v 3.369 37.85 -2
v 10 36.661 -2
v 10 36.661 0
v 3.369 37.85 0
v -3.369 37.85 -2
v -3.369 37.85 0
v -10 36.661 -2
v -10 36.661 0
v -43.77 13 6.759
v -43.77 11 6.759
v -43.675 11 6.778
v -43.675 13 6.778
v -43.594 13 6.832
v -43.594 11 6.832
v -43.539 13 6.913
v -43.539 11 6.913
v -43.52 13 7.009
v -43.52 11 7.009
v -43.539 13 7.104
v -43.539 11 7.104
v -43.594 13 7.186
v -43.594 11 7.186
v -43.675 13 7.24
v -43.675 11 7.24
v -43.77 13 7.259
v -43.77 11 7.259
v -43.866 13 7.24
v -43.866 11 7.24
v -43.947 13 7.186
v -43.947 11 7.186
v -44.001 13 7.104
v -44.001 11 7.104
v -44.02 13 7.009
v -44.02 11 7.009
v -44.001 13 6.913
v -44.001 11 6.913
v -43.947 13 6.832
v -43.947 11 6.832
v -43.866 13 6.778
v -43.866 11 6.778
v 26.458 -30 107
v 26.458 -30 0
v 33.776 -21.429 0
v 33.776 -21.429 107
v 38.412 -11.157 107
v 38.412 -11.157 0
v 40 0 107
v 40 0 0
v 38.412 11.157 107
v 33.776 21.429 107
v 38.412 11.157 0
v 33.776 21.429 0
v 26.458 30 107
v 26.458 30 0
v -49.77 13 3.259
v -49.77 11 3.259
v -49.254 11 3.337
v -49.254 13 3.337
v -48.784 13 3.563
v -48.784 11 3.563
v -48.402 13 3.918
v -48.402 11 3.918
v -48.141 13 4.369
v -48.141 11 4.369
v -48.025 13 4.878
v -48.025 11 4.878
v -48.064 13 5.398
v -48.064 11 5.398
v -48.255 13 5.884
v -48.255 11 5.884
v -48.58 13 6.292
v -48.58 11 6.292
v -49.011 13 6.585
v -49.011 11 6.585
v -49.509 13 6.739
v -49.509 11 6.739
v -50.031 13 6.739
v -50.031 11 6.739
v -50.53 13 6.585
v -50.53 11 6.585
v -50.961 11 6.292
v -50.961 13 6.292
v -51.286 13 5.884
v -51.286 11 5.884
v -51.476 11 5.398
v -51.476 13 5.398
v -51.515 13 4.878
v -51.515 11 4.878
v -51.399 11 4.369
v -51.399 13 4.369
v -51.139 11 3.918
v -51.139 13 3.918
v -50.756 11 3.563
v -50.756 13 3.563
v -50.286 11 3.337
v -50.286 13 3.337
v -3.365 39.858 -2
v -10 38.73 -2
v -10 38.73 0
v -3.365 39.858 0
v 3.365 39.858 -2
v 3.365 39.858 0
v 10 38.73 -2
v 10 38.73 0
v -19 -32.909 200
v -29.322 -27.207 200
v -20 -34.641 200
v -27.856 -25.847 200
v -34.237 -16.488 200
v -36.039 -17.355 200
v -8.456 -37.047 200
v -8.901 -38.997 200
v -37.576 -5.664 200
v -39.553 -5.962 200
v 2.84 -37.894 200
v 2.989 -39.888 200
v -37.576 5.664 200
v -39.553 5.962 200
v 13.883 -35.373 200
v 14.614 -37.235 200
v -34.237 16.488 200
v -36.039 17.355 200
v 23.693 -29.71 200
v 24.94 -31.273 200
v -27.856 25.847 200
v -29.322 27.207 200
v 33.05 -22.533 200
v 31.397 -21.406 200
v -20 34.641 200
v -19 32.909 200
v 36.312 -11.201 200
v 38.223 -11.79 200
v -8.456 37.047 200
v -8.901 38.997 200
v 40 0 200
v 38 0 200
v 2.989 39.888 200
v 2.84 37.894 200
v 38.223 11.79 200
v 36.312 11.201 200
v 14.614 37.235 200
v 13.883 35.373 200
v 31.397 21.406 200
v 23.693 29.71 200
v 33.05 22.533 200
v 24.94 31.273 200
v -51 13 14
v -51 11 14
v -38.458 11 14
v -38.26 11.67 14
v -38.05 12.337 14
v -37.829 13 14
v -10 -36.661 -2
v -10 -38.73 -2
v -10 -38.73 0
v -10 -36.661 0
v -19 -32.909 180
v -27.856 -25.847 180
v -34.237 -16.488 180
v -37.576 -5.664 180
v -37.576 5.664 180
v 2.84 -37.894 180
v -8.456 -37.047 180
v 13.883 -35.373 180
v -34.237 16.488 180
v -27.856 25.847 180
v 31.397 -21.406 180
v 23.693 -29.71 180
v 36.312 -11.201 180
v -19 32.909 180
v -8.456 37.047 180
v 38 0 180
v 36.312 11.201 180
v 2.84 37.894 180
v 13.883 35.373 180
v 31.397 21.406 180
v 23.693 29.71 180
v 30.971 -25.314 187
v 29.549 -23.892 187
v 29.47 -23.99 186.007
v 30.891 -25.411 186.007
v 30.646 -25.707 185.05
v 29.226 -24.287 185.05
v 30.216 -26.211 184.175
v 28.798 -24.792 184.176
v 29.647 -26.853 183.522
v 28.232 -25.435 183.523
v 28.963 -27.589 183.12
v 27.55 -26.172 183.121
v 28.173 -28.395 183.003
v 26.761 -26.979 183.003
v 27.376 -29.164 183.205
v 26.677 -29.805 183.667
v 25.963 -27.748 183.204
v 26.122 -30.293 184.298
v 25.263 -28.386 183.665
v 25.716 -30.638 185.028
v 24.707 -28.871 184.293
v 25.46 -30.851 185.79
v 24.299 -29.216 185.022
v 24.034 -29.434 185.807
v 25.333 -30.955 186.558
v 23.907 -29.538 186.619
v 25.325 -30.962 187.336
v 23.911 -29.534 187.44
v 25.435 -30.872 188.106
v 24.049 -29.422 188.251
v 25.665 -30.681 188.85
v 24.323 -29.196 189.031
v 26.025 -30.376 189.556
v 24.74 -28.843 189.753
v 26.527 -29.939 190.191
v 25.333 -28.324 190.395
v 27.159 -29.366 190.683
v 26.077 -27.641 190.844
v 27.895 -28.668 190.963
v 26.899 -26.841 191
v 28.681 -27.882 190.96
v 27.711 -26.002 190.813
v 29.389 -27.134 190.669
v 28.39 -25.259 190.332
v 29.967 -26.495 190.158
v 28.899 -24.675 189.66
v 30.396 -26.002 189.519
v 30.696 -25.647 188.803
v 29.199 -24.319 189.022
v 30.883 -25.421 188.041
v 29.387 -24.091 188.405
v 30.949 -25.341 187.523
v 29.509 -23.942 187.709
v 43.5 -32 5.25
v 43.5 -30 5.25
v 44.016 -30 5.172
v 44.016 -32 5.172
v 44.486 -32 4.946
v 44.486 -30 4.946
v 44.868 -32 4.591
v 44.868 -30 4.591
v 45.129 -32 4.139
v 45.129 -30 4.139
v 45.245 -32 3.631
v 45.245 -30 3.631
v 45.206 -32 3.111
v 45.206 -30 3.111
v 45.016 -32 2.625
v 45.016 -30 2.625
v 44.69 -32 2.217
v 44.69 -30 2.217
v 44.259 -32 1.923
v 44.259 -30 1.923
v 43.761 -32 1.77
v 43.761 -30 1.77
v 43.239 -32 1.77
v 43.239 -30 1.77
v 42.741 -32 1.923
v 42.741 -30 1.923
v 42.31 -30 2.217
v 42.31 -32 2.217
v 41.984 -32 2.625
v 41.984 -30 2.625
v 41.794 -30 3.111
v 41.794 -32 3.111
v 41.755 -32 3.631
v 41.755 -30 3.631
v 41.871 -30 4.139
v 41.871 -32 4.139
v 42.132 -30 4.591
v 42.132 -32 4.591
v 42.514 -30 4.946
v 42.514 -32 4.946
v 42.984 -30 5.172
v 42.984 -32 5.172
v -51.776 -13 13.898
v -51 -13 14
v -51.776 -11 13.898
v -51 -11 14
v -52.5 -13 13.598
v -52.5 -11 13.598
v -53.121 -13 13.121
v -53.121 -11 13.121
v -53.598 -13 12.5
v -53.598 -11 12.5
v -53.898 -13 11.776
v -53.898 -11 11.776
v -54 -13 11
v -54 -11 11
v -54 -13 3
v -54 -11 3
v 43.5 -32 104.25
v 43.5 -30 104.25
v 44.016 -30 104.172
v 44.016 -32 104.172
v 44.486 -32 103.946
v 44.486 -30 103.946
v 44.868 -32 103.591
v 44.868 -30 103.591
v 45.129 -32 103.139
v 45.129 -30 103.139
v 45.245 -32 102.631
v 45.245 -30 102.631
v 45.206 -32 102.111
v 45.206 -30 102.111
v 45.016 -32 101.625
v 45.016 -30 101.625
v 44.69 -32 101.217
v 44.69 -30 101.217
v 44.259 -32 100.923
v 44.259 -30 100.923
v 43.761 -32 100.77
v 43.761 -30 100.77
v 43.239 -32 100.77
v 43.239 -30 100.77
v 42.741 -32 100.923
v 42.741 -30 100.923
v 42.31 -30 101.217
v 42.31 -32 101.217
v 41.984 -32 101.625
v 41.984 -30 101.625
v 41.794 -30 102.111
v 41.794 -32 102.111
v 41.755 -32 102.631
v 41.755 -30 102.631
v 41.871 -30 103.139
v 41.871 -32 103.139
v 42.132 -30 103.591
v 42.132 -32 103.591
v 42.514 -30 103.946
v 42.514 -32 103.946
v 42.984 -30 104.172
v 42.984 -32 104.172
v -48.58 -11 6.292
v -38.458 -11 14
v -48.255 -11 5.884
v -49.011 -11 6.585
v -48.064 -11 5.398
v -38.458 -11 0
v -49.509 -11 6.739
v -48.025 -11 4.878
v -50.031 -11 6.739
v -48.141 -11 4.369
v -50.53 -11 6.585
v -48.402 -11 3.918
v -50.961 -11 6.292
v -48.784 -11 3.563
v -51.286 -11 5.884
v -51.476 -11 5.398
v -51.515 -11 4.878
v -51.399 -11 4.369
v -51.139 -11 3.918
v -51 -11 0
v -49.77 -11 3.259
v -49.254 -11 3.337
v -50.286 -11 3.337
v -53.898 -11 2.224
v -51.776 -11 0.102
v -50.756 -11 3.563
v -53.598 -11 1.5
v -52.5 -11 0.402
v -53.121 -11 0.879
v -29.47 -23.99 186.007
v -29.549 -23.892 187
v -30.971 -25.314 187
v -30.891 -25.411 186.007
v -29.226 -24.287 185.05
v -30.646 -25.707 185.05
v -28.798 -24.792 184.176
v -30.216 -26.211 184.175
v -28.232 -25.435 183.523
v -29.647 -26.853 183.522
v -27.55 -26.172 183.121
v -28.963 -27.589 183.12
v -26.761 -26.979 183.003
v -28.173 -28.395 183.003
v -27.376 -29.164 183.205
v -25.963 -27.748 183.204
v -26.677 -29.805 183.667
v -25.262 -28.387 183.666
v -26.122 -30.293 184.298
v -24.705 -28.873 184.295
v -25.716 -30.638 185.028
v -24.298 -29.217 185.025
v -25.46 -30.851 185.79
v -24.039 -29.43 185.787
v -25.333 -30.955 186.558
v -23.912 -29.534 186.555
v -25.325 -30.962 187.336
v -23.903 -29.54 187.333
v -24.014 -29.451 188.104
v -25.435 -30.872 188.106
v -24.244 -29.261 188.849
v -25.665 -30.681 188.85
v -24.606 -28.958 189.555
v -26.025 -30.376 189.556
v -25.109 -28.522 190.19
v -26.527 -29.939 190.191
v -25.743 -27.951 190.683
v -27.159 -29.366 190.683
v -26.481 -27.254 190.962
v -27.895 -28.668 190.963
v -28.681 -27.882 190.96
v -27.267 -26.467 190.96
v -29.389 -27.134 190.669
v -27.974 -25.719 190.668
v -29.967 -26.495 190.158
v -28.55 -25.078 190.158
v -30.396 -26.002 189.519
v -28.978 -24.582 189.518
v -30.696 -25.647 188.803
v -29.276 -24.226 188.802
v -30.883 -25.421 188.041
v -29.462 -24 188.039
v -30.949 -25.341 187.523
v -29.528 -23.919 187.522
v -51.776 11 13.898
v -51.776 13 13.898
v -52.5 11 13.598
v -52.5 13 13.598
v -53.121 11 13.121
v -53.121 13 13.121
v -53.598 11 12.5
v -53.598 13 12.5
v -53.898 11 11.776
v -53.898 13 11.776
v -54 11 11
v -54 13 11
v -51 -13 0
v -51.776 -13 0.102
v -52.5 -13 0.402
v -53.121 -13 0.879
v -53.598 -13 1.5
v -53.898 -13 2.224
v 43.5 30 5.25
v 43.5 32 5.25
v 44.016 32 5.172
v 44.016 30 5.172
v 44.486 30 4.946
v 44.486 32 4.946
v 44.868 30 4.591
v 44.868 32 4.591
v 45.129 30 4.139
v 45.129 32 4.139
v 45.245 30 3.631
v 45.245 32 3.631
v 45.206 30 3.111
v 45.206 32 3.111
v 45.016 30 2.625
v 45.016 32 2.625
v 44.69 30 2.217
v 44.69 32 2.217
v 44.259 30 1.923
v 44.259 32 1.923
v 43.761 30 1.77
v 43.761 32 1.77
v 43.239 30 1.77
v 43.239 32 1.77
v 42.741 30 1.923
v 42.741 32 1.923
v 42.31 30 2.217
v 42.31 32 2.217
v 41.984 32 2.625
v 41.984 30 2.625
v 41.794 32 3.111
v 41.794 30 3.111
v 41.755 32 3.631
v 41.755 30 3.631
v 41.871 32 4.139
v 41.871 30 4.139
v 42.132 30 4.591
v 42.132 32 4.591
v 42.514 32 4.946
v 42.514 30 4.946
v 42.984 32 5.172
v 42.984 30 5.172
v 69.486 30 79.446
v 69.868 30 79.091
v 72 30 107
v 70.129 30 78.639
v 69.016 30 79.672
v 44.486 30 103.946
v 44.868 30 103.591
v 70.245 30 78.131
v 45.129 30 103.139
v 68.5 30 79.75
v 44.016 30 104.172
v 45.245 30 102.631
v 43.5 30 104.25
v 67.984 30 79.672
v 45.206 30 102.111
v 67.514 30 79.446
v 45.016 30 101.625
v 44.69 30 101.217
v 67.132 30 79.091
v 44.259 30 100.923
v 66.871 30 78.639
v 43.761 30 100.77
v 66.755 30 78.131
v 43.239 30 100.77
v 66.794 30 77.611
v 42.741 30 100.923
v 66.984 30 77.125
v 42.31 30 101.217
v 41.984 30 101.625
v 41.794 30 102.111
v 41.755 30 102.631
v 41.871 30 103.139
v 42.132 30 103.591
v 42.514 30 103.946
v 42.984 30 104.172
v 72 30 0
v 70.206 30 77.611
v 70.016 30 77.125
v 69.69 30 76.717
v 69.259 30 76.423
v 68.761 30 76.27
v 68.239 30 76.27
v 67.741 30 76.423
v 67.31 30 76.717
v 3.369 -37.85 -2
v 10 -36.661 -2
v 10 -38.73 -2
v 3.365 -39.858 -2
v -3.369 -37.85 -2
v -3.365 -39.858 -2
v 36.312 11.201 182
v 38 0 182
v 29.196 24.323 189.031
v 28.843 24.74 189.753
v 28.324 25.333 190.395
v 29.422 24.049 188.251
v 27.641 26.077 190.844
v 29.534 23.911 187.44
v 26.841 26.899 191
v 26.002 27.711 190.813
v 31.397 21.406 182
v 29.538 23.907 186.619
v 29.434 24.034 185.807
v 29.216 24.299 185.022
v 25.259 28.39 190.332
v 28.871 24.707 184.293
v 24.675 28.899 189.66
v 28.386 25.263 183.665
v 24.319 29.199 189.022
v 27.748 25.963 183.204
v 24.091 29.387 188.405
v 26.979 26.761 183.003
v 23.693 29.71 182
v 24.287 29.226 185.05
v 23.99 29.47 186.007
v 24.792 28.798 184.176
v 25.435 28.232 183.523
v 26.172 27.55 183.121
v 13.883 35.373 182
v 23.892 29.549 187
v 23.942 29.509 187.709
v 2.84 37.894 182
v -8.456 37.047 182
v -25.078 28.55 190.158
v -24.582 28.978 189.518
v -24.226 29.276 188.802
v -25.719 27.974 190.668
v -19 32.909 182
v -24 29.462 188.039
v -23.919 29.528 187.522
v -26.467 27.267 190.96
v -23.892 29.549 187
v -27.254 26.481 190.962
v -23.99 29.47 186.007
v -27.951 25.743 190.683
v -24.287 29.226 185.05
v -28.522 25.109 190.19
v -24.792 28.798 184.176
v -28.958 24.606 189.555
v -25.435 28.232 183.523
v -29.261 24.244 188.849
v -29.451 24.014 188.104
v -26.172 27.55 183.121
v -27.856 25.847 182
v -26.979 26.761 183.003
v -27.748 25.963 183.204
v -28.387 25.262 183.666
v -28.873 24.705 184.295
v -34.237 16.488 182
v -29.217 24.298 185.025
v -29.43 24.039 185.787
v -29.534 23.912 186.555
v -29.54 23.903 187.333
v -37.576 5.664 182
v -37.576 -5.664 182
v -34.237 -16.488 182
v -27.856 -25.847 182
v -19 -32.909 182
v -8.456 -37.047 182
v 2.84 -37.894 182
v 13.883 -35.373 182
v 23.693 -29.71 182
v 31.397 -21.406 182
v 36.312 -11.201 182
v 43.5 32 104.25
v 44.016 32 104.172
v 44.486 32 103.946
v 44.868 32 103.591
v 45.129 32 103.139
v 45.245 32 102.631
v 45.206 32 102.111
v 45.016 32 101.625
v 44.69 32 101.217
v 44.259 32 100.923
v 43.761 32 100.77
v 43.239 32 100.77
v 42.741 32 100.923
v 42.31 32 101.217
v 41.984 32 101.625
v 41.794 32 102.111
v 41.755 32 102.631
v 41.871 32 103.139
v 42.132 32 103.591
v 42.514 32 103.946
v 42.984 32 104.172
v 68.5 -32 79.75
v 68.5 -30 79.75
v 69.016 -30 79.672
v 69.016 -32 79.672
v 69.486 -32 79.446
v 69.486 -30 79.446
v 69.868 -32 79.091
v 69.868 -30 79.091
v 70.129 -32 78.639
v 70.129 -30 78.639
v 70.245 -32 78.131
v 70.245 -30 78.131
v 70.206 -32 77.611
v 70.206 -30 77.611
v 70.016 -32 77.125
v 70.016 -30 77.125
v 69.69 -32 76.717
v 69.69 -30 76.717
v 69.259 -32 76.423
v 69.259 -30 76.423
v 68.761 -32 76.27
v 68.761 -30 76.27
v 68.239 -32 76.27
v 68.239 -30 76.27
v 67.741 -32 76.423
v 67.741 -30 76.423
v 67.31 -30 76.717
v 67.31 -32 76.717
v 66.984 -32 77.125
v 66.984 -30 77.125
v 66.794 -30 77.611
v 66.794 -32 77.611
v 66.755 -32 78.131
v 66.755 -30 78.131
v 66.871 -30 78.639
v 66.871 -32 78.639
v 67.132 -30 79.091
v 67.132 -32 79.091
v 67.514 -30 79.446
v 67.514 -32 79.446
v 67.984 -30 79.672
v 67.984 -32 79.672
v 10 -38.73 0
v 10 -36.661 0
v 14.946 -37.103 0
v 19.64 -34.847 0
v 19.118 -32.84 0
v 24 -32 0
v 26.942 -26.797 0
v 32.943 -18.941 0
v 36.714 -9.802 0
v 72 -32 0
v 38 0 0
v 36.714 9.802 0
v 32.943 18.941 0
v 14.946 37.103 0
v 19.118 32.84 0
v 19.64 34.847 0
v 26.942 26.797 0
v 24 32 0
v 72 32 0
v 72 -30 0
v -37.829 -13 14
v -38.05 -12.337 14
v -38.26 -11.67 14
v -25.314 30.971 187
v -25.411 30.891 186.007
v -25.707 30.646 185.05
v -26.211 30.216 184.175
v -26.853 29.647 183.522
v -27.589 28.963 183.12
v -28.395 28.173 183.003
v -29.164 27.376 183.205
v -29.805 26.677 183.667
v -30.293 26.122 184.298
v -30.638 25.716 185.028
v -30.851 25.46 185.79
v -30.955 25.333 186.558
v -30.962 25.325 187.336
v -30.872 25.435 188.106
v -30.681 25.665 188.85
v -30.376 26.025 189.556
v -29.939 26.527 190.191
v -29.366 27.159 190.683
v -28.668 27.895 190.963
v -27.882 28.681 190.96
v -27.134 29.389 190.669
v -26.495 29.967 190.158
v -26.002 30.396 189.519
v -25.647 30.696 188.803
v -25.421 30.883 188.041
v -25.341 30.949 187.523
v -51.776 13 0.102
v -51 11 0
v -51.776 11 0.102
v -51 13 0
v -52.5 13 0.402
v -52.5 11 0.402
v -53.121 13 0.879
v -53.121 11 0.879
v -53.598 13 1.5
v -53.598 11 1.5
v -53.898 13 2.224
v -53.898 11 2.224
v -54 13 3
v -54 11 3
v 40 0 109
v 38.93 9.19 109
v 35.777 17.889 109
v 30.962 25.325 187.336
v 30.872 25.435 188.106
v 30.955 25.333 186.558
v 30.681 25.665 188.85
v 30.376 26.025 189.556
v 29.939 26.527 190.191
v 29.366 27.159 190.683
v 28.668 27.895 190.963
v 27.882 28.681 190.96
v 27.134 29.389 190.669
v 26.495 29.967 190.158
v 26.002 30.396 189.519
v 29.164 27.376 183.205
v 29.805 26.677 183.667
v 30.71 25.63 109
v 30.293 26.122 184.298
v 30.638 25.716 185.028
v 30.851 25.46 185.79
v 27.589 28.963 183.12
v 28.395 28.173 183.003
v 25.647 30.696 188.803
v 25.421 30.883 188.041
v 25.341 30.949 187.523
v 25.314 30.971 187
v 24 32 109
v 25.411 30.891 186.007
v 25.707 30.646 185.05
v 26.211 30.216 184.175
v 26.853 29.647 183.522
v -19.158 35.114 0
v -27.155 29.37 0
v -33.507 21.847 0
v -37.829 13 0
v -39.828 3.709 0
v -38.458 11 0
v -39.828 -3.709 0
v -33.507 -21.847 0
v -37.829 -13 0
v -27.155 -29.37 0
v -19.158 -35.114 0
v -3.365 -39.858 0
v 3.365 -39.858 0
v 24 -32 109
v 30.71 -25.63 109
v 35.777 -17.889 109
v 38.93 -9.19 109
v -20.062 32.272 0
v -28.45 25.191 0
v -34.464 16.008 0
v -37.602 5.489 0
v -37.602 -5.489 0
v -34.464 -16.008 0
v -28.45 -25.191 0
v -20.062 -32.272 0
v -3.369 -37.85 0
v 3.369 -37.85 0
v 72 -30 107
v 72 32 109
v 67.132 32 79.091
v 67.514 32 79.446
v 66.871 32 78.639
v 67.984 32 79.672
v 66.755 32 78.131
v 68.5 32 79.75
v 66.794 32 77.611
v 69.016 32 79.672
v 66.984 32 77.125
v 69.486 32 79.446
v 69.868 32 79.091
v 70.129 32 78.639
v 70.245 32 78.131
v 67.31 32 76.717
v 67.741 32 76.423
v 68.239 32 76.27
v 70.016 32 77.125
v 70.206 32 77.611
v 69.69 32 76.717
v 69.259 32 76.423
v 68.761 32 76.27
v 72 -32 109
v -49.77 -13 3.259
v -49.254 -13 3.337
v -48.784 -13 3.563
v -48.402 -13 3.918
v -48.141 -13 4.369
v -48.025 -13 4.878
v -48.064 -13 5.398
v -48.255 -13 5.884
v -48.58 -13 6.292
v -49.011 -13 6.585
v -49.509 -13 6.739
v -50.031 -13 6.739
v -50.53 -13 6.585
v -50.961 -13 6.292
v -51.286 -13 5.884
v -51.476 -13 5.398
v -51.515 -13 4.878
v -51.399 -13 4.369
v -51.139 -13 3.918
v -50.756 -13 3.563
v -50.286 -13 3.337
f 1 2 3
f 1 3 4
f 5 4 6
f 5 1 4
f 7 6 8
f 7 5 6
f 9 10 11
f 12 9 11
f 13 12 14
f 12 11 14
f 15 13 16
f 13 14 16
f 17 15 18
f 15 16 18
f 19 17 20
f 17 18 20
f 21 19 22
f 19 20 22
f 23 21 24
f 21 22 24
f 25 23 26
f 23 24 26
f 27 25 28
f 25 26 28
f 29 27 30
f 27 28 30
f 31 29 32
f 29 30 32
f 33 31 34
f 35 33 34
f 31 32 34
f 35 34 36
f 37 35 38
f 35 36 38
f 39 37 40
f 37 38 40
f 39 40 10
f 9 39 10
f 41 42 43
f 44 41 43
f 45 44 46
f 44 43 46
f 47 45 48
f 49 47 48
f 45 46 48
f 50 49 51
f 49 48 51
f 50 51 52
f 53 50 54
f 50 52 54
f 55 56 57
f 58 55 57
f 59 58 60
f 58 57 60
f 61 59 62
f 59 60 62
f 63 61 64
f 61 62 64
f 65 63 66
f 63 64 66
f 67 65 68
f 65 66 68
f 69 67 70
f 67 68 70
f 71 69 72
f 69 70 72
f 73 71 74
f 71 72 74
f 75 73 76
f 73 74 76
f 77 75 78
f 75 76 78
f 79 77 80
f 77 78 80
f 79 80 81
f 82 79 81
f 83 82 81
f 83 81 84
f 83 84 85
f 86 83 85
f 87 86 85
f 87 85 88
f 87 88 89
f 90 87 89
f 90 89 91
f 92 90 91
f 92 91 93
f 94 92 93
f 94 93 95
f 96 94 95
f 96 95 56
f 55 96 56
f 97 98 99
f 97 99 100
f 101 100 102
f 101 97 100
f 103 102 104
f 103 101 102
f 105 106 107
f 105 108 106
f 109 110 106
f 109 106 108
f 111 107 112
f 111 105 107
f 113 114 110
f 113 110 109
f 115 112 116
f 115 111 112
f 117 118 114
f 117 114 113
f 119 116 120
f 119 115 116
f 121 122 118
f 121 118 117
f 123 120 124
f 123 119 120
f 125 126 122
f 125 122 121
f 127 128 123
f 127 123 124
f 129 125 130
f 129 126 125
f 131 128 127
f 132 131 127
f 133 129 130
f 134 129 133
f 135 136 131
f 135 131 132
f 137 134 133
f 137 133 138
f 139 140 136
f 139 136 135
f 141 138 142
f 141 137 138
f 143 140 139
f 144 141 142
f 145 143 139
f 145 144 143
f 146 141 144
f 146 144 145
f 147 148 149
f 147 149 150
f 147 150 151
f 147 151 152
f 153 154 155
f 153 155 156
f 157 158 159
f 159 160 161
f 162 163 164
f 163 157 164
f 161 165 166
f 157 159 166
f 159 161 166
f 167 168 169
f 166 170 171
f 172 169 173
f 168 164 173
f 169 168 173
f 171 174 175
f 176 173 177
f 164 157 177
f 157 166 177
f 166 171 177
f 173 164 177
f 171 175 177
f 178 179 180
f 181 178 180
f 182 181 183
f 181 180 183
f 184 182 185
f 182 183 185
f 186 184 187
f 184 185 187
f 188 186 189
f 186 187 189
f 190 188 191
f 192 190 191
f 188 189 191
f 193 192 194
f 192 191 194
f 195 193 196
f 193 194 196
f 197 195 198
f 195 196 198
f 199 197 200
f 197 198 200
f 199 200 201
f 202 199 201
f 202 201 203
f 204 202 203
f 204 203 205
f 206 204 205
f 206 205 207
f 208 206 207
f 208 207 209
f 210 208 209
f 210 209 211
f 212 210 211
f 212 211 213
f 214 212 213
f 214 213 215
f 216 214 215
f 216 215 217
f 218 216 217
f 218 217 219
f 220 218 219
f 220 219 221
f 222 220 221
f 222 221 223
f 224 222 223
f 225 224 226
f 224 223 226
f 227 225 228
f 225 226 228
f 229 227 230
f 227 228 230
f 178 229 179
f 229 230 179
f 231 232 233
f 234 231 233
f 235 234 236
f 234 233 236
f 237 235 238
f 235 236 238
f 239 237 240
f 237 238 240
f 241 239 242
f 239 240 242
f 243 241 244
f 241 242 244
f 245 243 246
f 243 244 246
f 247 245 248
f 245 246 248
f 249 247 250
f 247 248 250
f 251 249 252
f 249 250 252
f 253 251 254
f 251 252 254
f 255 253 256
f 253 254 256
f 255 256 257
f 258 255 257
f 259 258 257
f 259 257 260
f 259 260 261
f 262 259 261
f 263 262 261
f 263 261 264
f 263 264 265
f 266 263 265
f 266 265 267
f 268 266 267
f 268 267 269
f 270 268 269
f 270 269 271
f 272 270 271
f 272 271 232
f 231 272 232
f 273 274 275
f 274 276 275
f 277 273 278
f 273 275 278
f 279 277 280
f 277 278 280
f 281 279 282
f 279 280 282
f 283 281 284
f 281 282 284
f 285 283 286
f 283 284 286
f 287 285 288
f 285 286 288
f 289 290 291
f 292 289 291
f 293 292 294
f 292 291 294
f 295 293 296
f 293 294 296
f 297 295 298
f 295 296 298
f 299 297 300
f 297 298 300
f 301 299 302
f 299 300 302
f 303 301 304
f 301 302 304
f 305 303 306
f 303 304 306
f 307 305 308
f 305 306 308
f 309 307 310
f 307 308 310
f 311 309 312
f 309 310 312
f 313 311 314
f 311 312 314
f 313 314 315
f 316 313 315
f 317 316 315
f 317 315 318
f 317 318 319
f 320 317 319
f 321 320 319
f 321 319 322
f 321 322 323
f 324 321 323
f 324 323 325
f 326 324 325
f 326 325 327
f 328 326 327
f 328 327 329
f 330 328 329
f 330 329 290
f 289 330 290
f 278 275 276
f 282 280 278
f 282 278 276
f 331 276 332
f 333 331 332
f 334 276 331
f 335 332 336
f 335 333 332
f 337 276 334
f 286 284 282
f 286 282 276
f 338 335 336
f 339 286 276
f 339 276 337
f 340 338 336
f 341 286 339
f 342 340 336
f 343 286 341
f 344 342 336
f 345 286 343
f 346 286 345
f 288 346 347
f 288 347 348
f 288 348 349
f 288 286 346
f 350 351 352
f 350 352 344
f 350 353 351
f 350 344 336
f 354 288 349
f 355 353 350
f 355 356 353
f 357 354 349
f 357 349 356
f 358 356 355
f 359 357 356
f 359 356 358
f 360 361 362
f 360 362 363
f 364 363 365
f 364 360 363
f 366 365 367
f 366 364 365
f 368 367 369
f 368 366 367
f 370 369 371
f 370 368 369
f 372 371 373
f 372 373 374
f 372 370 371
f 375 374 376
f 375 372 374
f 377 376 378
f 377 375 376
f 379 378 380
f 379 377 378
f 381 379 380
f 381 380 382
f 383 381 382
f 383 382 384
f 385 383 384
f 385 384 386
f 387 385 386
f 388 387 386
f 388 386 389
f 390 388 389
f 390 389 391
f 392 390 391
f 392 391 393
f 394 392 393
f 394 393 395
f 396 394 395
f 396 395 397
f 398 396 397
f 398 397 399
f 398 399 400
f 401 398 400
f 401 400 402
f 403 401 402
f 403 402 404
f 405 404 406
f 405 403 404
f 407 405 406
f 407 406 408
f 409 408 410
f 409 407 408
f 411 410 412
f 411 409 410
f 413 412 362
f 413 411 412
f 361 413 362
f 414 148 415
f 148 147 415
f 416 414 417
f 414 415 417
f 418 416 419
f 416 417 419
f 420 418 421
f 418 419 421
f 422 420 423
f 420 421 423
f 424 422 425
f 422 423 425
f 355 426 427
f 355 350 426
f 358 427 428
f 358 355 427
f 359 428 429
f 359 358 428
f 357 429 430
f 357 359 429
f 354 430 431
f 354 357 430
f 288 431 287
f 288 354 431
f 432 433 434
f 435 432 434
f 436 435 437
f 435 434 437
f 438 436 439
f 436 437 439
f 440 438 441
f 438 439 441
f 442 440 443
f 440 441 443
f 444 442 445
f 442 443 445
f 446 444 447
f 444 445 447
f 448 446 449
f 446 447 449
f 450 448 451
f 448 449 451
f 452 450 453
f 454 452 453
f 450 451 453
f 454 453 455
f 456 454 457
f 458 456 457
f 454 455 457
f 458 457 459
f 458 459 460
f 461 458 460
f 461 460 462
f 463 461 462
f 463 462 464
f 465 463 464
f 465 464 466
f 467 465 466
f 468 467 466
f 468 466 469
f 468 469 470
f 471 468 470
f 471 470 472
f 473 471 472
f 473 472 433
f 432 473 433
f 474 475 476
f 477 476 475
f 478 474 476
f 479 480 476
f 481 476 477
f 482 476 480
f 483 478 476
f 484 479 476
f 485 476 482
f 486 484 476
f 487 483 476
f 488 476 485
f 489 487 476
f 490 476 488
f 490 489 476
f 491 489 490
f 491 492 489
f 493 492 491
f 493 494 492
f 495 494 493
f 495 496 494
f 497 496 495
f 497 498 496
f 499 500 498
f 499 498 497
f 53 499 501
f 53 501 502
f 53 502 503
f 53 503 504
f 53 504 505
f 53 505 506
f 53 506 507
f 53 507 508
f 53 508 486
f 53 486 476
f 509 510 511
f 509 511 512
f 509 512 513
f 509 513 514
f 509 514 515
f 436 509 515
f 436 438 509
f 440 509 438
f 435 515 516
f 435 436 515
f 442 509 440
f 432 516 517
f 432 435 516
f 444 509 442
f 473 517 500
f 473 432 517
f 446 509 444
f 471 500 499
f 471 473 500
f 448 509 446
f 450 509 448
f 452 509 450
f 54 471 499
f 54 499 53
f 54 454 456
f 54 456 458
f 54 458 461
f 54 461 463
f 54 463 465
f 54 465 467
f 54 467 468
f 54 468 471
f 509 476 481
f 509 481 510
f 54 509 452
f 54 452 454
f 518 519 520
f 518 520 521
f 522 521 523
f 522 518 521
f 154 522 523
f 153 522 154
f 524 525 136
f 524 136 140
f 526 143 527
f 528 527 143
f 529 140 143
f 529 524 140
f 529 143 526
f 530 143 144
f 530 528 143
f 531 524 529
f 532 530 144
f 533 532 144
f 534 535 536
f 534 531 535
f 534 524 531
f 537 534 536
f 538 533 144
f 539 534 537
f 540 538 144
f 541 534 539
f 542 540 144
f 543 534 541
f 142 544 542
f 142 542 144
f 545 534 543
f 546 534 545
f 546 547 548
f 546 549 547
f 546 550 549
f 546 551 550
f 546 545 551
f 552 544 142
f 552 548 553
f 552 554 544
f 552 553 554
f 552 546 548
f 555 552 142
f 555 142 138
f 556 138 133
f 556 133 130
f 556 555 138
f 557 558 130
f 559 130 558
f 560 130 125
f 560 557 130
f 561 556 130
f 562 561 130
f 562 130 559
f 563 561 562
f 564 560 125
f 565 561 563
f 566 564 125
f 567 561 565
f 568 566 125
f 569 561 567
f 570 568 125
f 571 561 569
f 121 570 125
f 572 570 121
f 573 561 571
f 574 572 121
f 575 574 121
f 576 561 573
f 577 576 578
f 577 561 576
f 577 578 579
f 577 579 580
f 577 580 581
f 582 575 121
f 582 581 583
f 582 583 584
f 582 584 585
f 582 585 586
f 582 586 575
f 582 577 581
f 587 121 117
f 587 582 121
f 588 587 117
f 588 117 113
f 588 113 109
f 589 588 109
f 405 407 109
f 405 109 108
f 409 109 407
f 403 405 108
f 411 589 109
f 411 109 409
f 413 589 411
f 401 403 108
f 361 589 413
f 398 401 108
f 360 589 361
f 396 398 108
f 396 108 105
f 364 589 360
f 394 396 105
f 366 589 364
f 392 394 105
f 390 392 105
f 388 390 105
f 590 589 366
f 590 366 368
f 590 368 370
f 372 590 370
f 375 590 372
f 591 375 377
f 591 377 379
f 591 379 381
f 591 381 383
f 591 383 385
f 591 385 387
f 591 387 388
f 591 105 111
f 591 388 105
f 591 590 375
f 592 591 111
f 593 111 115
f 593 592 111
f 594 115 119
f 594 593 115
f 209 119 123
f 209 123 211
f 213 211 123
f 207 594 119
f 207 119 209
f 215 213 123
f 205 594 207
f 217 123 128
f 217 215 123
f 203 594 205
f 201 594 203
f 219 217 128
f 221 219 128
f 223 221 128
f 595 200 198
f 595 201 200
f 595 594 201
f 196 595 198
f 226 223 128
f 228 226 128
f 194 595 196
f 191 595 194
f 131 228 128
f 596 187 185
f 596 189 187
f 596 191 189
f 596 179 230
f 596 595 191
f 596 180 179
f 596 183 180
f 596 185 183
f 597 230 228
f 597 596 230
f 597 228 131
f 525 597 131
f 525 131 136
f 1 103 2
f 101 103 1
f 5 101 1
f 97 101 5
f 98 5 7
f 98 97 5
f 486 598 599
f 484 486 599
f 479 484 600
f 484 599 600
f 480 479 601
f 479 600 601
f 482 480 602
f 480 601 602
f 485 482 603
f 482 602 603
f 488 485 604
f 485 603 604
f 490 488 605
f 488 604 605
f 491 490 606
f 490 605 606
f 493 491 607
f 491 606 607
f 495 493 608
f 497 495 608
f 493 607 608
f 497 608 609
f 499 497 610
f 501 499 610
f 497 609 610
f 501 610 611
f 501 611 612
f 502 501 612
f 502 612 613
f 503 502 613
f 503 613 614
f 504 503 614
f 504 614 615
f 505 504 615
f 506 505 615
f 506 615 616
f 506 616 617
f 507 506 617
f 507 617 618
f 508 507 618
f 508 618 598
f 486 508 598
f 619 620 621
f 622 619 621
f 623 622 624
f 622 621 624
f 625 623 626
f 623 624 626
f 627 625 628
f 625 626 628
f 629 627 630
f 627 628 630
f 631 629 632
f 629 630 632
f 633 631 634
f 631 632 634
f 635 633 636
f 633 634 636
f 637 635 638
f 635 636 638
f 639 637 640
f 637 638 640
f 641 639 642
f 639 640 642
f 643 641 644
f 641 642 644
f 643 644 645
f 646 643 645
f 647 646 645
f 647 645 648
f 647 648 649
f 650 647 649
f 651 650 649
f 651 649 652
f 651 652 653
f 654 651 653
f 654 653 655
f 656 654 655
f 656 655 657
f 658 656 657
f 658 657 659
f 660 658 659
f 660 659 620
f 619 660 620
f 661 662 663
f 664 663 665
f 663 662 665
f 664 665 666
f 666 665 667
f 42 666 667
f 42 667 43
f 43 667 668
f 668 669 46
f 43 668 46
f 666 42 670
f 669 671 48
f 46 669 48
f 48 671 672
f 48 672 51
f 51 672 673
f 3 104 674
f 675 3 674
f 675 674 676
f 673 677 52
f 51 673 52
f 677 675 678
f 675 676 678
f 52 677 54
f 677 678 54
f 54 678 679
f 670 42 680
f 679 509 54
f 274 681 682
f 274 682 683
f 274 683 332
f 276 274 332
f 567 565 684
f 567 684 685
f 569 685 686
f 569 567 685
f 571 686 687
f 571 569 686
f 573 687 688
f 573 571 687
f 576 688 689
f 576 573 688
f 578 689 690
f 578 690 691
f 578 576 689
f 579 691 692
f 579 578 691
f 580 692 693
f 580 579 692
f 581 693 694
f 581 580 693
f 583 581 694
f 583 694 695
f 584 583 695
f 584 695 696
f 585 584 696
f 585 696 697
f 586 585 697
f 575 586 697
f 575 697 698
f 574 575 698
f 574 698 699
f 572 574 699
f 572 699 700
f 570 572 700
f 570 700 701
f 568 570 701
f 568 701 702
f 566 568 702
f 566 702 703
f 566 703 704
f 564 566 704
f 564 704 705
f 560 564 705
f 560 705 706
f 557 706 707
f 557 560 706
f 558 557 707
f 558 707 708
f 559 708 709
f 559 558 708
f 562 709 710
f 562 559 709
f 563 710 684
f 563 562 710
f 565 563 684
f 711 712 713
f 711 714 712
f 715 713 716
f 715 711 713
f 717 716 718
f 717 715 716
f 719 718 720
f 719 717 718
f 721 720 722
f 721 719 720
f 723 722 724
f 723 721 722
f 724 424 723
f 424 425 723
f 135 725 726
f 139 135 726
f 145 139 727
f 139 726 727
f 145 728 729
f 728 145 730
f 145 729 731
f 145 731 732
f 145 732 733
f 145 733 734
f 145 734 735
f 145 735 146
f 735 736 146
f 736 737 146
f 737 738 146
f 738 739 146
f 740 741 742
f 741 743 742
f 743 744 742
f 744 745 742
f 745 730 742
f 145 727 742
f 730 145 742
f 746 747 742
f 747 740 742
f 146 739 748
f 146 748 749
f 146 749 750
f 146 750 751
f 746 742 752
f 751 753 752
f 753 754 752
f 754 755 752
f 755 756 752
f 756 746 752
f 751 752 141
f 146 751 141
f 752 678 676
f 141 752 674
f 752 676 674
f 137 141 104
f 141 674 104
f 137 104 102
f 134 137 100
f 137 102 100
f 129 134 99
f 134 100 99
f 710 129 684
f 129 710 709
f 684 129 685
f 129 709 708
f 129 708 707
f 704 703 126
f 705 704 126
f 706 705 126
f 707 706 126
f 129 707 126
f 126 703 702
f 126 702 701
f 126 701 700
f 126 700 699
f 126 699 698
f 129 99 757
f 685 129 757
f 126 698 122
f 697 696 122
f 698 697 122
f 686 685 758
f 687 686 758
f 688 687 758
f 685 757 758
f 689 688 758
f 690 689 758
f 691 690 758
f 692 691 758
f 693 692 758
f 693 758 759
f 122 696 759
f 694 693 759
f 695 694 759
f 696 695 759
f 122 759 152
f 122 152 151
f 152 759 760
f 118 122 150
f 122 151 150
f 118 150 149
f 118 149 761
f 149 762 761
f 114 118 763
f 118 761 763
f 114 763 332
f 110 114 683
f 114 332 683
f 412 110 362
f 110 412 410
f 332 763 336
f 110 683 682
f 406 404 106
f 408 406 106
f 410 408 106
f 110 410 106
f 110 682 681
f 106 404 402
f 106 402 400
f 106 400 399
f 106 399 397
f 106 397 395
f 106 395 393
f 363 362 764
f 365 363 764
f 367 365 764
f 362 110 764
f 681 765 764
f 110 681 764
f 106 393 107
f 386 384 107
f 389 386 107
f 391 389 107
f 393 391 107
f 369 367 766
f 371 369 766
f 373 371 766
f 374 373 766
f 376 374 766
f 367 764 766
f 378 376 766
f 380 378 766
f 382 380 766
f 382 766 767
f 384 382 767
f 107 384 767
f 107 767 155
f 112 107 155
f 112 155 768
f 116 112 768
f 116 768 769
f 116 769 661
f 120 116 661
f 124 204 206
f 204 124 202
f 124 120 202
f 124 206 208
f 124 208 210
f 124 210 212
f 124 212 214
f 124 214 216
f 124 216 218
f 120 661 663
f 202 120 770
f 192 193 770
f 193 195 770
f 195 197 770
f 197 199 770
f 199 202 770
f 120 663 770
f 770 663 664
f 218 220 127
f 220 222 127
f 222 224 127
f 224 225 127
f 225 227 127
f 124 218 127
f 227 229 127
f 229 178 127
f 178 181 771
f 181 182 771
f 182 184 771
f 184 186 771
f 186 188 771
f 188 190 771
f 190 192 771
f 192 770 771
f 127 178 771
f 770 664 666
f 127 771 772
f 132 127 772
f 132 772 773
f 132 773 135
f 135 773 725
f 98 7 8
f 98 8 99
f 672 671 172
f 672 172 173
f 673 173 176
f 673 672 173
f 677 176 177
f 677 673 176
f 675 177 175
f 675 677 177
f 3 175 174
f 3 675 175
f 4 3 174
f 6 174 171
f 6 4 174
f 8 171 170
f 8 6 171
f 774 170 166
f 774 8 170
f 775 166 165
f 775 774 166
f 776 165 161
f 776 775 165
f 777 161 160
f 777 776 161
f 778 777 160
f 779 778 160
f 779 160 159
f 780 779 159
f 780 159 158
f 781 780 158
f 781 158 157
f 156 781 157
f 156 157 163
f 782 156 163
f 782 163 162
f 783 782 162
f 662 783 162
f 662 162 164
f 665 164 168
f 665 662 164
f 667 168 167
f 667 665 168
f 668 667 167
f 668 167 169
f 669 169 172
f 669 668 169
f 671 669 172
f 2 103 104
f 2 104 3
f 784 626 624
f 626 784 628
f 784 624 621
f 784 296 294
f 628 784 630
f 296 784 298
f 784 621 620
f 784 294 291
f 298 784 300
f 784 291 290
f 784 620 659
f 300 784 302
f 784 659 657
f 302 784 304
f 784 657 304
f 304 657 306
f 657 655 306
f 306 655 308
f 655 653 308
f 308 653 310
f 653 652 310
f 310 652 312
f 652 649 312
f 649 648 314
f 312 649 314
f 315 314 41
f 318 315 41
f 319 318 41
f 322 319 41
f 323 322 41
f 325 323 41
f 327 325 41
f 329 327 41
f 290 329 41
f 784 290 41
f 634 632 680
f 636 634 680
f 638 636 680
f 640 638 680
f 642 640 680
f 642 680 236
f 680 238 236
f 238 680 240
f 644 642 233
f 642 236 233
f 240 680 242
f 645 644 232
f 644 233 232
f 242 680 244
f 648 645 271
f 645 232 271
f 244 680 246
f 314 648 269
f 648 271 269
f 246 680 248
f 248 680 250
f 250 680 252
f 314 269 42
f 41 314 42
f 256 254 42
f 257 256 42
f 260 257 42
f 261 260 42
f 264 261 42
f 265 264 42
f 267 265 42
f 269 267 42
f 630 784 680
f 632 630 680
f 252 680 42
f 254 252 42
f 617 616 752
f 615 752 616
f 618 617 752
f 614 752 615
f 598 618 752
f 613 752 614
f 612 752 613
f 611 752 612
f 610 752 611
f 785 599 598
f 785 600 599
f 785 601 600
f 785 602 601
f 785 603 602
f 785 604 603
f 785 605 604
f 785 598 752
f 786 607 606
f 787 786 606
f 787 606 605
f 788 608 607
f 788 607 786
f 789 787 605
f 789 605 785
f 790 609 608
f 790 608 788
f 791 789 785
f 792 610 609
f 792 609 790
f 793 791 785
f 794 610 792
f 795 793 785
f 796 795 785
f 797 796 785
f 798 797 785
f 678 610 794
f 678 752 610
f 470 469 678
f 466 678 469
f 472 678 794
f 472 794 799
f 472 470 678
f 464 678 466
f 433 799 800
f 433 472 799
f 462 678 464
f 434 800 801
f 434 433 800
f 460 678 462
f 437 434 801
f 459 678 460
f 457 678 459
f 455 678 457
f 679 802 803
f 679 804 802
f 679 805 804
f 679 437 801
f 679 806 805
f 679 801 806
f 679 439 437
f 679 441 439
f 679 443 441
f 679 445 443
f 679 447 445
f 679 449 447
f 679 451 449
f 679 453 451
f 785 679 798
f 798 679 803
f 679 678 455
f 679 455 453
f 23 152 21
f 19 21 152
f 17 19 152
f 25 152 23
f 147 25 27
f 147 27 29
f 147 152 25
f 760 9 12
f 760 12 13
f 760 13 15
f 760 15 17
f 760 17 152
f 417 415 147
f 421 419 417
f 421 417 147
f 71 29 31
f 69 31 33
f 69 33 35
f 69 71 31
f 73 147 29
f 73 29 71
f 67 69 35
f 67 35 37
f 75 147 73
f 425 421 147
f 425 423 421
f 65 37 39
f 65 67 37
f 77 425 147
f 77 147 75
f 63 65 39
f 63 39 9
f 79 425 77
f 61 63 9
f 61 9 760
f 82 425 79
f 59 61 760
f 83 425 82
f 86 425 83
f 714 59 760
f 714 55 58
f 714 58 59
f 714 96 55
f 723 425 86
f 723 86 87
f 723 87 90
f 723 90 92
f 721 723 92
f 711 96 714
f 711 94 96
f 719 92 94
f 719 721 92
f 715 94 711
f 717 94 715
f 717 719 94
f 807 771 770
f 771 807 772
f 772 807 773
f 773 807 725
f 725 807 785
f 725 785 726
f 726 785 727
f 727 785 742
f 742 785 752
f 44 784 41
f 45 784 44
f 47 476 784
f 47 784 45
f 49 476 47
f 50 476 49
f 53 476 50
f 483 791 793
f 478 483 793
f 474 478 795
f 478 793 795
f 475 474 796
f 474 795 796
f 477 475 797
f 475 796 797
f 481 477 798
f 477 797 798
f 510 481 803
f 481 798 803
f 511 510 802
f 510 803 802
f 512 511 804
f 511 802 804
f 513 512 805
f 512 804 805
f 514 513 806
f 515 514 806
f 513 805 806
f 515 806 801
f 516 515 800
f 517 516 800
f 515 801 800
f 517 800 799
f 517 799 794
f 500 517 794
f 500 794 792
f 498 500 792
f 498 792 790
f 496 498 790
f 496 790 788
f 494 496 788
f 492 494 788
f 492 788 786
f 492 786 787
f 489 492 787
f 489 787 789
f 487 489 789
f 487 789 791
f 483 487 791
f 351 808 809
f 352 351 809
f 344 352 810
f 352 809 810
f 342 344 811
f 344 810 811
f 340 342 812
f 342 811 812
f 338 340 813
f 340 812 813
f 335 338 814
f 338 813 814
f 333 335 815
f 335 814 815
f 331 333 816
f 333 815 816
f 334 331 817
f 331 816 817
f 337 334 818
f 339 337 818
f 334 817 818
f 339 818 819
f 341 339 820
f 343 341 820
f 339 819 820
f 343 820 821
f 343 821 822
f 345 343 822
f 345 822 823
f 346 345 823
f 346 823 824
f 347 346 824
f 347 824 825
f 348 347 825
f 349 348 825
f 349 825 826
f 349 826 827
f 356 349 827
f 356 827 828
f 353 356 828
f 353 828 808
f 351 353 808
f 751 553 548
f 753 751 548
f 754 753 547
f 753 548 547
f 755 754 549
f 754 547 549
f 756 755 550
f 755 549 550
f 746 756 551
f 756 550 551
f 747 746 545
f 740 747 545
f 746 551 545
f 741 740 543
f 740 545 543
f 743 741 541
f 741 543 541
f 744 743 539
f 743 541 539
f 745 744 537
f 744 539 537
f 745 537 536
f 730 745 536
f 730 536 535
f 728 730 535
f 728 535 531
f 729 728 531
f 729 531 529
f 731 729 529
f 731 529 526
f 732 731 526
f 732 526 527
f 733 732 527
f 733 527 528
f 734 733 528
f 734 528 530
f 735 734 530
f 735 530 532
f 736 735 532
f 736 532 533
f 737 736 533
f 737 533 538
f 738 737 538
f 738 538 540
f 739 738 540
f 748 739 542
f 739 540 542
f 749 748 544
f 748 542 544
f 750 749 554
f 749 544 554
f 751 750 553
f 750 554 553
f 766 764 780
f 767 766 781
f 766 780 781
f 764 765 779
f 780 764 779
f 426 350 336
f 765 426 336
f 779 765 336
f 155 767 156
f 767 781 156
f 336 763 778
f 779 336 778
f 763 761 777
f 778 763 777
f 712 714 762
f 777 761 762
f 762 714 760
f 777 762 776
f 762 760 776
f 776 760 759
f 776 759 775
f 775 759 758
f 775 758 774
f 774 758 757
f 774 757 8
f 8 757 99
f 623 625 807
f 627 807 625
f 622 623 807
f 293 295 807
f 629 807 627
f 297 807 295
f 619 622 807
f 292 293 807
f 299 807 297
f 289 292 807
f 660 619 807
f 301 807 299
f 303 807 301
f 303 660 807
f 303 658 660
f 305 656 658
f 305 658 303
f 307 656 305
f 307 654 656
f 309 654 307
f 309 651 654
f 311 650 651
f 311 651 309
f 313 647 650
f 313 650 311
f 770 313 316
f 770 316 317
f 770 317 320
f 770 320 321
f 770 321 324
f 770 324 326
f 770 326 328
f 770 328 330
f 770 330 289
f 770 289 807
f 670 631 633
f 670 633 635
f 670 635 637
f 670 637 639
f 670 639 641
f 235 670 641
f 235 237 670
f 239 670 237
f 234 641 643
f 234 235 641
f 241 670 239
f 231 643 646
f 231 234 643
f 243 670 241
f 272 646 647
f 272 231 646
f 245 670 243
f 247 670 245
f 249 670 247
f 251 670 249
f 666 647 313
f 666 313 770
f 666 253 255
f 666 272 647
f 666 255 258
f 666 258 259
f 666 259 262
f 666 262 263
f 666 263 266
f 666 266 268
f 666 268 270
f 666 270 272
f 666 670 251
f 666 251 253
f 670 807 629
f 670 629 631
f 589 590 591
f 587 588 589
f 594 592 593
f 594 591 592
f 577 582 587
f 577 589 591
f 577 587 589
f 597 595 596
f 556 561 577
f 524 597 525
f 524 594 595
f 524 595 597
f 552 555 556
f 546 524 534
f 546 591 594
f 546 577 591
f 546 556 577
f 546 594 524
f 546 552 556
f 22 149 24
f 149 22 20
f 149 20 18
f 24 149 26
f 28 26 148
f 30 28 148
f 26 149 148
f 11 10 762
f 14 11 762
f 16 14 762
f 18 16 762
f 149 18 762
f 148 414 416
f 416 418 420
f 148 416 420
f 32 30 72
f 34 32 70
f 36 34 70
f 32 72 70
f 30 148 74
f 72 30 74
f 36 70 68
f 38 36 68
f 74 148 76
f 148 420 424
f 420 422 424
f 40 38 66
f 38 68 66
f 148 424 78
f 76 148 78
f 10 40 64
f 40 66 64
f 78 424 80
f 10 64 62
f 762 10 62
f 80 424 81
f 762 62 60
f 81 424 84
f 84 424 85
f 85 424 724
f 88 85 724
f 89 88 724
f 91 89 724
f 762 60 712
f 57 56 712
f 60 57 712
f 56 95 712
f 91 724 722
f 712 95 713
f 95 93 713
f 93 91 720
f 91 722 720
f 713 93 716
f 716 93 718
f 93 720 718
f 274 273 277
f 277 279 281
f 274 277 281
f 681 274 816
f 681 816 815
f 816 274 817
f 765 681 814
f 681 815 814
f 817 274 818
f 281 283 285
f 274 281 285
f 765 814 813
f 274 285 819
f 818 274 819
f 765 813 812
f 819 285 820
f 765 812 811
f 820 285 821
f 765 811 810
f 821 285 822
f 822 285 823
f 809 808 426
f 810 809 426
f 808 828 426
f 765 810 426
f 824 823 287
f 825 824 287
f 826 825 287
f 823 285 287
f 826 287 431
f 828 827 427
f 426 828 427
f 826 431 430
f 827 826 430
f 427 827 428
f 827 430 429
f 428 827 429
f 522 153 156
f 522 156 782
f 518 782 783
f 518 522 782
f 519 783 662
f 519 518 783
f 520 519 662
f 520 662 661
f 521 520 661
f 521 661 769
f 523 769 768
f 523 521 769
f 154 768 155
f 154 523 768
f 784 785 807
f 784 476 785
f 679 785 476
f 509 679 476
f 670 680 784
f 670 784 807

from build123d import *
from build123d.topology import SkipClean

# Parameters (mm, degrees)
SKETCH1_R                      = 40
SKETCH1_R_2                    = 38
BOSS_EXTRUDE1_DEPTH            = 200
SKETCH2_R                      = 40
BOSS_EXTRUDE2_DEPTH            = 2
BOSS_EXTRUDE3_DEPTH            = 107
BOSS_EXTRUDE4_DEPTH            = 2
SKETCH5_R                      = 1.75
CUT_EXTRUDE1_DEPTH             = 225.428162226
CUT_EXTRUDE2_REACH             = 218.296
SKETCH6_R                      = 4
CUT_EXTRUDE2_DIRECTION_2_REACH = 218.296
CIRPATTERN1_COUNT              = 2
CIRPATTERN1_ANGLE              = 90
BOSS_EXTRUDE5_REACH            = 241.742
BOSS_EXTRUDE5_END_RADIUS       = 40
SKETCH7_W                      = 14
SKETCH7_H                      = 2
CUT_EXTRUDE3_REACH             = 221.073
SKETCH8_R                      = 1.75
FILLET1_R                      = 3
CUT_EXTRUDE4_REACH             = 220.598
SKETCH9_R                      = 0.25
BOSS_EXTRUDE6_START            = 2
BOSS_EXTRUDE6_DEPTH            = 2


with BuildPart() as part:
    # Sketch1 → Boss-Extrude1 (new body)
    with BuildSketch(Plane.XY):
        Circle(SKETCH1_R)
        Circle(SKETCH1_R_2, mode=Mode.SUBTRACT)
    extrude(amount=BOSS_EXTRUDE1_DEPTH)

    # Sketch2 → Boss-Extrude2 (add)
    with BuildSketch(Plane.XY.offset(180)):
        Circle(SKETCH2_R)
    extrude(amount=BOSS_EXTRUDE2_DEPTH)

    # Sketch3 → Boss-Extrude3 (add)
    with BuildSketch(Plane(origin=(0, 0, 0), x_dir=(-1, 0, 0), z_dir=(0, 0, -1))):
        with BuildLine():
            Line((-24, -32), (-72, -32))
            Line((-72, -32), (-72, -30))
            Line((-72, -30), (-26.457513111, -30))
            ThreePointArc((-26.457513111, -30), (-25.248567431, -31.024342744), (-24, -32))
        make_face()
        with BuildLine():
            Line((-24, 32), (-72, 32))
            Line((-72, 32), (-72, 30))
            Line((-72, 30), (-26.457513111, 30))
            ThreePointArc((-26.457513111, 30), (-25.248567431, 31.024342744), (-24, 32))
        make_face()
    extrude(amount=-BOSS_EXTRUDE3_DEPTH)

    # Sketch4 → Boss-Extrude4 (add)
    with BuildSketch(Plane.XY.offset(107)):
        with BuildLine():
            Line((72, -32), (24, -32))
            ThreePointArc((24, -32), (40, 0), (24, 32))
            Line((24, 32), (72, 32))
            Line((72, 32), (72, -32))
        make_face()
    extrude(amount=BOSS_EXTRUDE4_DEPTH)

    # Sketch5 → Cut-Extrude1 (cut, through all)
    with BuildSketch(Plane(origin=(0, 32, 0), x_dir=(1, 0, 0), z_dir=(0, 1, 0))):
        with Locations(Location((43.5, -102.5, 0), (0, 0, 270))):
            Circle(SKETCH5_R)
        with Locations(Location((43.5, -3.5, 0), (0, 0, 270))):
            Circle(SKETCH5_R)
        with Locations(Location((68.5, -78, 0), (0, 0, 270))):
            Circle(SKETCH5_R)
    extrude(amount=-CUT_EXTRUDE1_DEPTH, mode=Mode.SUBTRACT)

    # Sketch6 → Cut-Extrude2 (cut, up to next)
    with BuildSketch(Plane(origin=(0, 0, 0), x_dir=(0, 0, 1), z_dir=(-0.7071067811865488, 0.7071067811865464, 0)), mode=Mode.PRIVATE) as cut_extrude2_sk1:
        with Locations(Location((187, 0, 0), (0, 0, 90))):
            Circle(SKETCH6_R)
    cut_extrude2_tool1 = extrude(cut_extrude2_sk1.sketch, amount=-CUT_EXTRUDE2_REACH, mode=Mode.PRIVATE) & part.part
    cut_extrude2 = cut_extrude2_tool1.solids().sort_by_distance((0, 0, 187))[0]
    add(cut_extrude2, mode=Mode.SUBTRACT)

    # Sketch6 → Cut-Extrude2 direction 2 (cut, up to next)
    with BuildSketch(Plane(origin=(0, 0, 0), x_dir=(0, 0, 1), z_dir=(-0.7071067811865488, 0.7071067811865464, 0)), mode=Mode.PRIVATE) as cut_extrude2_direction_2_sk1:
        with Locations(Location((187, 0, 0), (0, 0, 90))):
            Circle(SKETCH6_R)
    cut_extrude2_direction_2_tool1 = extrude(cut_extrude2_direction_2_sk1.sketch, amount=CUT_EXTRUDE2_DIRECTION_2_REACH, mode=Mode.PRIVATE) & part.part
    cut_extrude2_direction_2 = cut_extrude2_direction_2_tool1.solids().sort_by_distance((0, 0, 187))[0]
    add(cut_extrude2_direction_2, mode=Mode.SUBTRACT)

    # CirPattern1: Cut-Extrude2, Cut-Extrude2 direction 2 ×2 about axis
    cirpattern1_axis = Axis((0, 0, -12.1), (0, 0, 1))
    add([cut_extrude2.rotate(cirpattern1_axis, i * CIRPATTERN1_ANGLE / (CIRPATTERN1_COUNT - 1)) for i in range(1, CIRPATTERN1_COUNT)], mode=Mode.SUBTRACT)
    add([cut_extrude2_direction_2.rotate(cirpattern1_axis, i * CIRPATTERN1_ANGLE / (CIRPATTERN1_COUNT - 1)) for i in range(1, CIRPATTERN1_COUNT)], mode=Mode.SUBTRACT)

    # Boss-Extrude5: up to this cylinder (the profile starts outside it)
    boss_extrude5_end = Plane(origin=(0, 0, 7), z_dir=(0, 0, -1)) * Cylinder(BOSS_EXTRUDE5_END_RADIUS, 564.484, mode=Mode.PRIVATE)
    # Sketch7 → Boss-Extrude5 (add, up to the surface)
    with BuildSketch(Plane(origin=(-54, 0, 0), x_dir=(0, 0, -1), z_dir=(1, 0, 0)), mode=Mode.PRIVATE) as boss_extrude5_sk1:
        with Locations((-7, -12)):
            Rectangle(SKETCH7_W, SKETCH7_H)
    boss_extrude5_tool1 = extrude(boss_extrude5_sk1.sketch, amount=BOSS_EXTRUDE5_REACH, mode=Mode.PRIVATE) - boss_extrude5_end
    add(boss_extrude5_tool1.solids().sort_by_distance((-54, -12, 7))[0])
    # Sketch7 → Boss-Extrude5 (add, up to the surface)
    with BuildSketch(Plane(origin=(-54, 0, 0), x_dir=(0, 0, -1), z_dir=(1, 0, 0)), mode=Mode.PRIVATE) as boss_extrude5_sk2:
        with Locations((-7, 12)):
            Rectangle(SKETCH7_W, SKETCH7_H)
    boss_extrude5_tool2 = extrude(boss_extrude5_sk2.sketch, amount=BOSS_EXTRUDE5_REACH, mode=Mode.PRIVATE) - boss_extrude5_end
    add(boss_extrude5_tool2.solids().sort_by_distance((-54, 12, 7))[0])

    # Cut-Extrude3: up to this face of the body (flat: up to its plane)
    cut_extrude3_end = Plane(part.part.faces().sort_by_distance((-45.914280319, 13, 7))[0])
    # Sketch8 → Cut-Extrude3 (cut, up to the picked face)
    with BuildSketch(Plane.XZ.offset(13), mode=Mode.PRIVATE) as cut_extrude3_sk1:
        with Locations(Location((-49.770305539, 5.008755099, 0), (0, 0, 270))):
            Circle(SKETCH8_R)
    cut_extrude3_tool1 = split(extrude(cut_extrude3_sk1.sketch, amount=-CUT_EXTRUDE3_REACH, mode=Mode.PRIVATE), bisect_by=cut_extrude3_end, keep=Keep.BOTH, mode=Mode.PRIVATE)
    add(cut_extrude3_tool1.solids().sort_by(Axis((-49.770306, -13, 5.008755), (0, 1, 0)))[0], mode=Mode.SUBTRACT)

    # Fillet1
    fillet1_edges = [part.edges().sort_by_distance(p)[0] for p in [
        (-54, -12, 14),
        (-54, -12, 0),
        (-54, 12, 0),
        (-54, 12, 14),
    ]]
    fillet(fillet1_edges, radius=FILLET1_R)

    # Sketch9 → Cut-Extrude4 (cut, up to next)
    with BuildSketch(Plane.XZ.offset(-11), mode=Mode.PRIVATE) as cut_extrude4_sk1:
        with Locations(Location((-43.770305539, 7.008755099, 0), (0, 0, 270))):
            Circle(SKETCH9_R)
    cut_extrude4_tool1 = extrude(cut_extrude4_sk1.sketch, amount=-CUT_EXTRUDE4_REACH, mode=Mode.PRIVATE) & part.part
    add(cut_extrude4_tool1.solids().sort_by_distance((-43.770306, 11, 7.008755))[0], mode=Mode.SUBTRACT)

    # Sketch10 → Boss-Extrude6 (add)
    with SkipClean():  # the faces are left unmerged after this step: merging them gives an invalid solid
        with BuildSketch(Plane(origin=(0, 0, 0), x_dir=(-1, 0, 0), z_dir=(0, 0, -1)).offset(BOSS_EXTRUDE6_START)):
            with BuildLine():
                ThreePointArc((10, -36.66060556), (0, -38), (-10, -36.66060556))
                Line((-10, -36.66060556), (-10, -38.729833462))
                ThreePointArc((-10, -38.729833462), (0, -40), (10, -38.729833462))
                Line((10, -38.729833462), (10, -36.66060556))
            make_face()
            with BuildLine():
                ThreePointArc((10, 38.729833462), (0, 40), (-10, 38.729833462))
                Line((-10, 38.729833462), (-10, 36.66060556))
                ThreePointArc((-10, 36.66060556), (0, 38), (10, 36.66060556))
                Line((10, 36.66060556), (10, 38.729833462))
            make_face()
        extrude(amount=-BOSS_EXTRUDE6_DEPTH)


solid = part.part
